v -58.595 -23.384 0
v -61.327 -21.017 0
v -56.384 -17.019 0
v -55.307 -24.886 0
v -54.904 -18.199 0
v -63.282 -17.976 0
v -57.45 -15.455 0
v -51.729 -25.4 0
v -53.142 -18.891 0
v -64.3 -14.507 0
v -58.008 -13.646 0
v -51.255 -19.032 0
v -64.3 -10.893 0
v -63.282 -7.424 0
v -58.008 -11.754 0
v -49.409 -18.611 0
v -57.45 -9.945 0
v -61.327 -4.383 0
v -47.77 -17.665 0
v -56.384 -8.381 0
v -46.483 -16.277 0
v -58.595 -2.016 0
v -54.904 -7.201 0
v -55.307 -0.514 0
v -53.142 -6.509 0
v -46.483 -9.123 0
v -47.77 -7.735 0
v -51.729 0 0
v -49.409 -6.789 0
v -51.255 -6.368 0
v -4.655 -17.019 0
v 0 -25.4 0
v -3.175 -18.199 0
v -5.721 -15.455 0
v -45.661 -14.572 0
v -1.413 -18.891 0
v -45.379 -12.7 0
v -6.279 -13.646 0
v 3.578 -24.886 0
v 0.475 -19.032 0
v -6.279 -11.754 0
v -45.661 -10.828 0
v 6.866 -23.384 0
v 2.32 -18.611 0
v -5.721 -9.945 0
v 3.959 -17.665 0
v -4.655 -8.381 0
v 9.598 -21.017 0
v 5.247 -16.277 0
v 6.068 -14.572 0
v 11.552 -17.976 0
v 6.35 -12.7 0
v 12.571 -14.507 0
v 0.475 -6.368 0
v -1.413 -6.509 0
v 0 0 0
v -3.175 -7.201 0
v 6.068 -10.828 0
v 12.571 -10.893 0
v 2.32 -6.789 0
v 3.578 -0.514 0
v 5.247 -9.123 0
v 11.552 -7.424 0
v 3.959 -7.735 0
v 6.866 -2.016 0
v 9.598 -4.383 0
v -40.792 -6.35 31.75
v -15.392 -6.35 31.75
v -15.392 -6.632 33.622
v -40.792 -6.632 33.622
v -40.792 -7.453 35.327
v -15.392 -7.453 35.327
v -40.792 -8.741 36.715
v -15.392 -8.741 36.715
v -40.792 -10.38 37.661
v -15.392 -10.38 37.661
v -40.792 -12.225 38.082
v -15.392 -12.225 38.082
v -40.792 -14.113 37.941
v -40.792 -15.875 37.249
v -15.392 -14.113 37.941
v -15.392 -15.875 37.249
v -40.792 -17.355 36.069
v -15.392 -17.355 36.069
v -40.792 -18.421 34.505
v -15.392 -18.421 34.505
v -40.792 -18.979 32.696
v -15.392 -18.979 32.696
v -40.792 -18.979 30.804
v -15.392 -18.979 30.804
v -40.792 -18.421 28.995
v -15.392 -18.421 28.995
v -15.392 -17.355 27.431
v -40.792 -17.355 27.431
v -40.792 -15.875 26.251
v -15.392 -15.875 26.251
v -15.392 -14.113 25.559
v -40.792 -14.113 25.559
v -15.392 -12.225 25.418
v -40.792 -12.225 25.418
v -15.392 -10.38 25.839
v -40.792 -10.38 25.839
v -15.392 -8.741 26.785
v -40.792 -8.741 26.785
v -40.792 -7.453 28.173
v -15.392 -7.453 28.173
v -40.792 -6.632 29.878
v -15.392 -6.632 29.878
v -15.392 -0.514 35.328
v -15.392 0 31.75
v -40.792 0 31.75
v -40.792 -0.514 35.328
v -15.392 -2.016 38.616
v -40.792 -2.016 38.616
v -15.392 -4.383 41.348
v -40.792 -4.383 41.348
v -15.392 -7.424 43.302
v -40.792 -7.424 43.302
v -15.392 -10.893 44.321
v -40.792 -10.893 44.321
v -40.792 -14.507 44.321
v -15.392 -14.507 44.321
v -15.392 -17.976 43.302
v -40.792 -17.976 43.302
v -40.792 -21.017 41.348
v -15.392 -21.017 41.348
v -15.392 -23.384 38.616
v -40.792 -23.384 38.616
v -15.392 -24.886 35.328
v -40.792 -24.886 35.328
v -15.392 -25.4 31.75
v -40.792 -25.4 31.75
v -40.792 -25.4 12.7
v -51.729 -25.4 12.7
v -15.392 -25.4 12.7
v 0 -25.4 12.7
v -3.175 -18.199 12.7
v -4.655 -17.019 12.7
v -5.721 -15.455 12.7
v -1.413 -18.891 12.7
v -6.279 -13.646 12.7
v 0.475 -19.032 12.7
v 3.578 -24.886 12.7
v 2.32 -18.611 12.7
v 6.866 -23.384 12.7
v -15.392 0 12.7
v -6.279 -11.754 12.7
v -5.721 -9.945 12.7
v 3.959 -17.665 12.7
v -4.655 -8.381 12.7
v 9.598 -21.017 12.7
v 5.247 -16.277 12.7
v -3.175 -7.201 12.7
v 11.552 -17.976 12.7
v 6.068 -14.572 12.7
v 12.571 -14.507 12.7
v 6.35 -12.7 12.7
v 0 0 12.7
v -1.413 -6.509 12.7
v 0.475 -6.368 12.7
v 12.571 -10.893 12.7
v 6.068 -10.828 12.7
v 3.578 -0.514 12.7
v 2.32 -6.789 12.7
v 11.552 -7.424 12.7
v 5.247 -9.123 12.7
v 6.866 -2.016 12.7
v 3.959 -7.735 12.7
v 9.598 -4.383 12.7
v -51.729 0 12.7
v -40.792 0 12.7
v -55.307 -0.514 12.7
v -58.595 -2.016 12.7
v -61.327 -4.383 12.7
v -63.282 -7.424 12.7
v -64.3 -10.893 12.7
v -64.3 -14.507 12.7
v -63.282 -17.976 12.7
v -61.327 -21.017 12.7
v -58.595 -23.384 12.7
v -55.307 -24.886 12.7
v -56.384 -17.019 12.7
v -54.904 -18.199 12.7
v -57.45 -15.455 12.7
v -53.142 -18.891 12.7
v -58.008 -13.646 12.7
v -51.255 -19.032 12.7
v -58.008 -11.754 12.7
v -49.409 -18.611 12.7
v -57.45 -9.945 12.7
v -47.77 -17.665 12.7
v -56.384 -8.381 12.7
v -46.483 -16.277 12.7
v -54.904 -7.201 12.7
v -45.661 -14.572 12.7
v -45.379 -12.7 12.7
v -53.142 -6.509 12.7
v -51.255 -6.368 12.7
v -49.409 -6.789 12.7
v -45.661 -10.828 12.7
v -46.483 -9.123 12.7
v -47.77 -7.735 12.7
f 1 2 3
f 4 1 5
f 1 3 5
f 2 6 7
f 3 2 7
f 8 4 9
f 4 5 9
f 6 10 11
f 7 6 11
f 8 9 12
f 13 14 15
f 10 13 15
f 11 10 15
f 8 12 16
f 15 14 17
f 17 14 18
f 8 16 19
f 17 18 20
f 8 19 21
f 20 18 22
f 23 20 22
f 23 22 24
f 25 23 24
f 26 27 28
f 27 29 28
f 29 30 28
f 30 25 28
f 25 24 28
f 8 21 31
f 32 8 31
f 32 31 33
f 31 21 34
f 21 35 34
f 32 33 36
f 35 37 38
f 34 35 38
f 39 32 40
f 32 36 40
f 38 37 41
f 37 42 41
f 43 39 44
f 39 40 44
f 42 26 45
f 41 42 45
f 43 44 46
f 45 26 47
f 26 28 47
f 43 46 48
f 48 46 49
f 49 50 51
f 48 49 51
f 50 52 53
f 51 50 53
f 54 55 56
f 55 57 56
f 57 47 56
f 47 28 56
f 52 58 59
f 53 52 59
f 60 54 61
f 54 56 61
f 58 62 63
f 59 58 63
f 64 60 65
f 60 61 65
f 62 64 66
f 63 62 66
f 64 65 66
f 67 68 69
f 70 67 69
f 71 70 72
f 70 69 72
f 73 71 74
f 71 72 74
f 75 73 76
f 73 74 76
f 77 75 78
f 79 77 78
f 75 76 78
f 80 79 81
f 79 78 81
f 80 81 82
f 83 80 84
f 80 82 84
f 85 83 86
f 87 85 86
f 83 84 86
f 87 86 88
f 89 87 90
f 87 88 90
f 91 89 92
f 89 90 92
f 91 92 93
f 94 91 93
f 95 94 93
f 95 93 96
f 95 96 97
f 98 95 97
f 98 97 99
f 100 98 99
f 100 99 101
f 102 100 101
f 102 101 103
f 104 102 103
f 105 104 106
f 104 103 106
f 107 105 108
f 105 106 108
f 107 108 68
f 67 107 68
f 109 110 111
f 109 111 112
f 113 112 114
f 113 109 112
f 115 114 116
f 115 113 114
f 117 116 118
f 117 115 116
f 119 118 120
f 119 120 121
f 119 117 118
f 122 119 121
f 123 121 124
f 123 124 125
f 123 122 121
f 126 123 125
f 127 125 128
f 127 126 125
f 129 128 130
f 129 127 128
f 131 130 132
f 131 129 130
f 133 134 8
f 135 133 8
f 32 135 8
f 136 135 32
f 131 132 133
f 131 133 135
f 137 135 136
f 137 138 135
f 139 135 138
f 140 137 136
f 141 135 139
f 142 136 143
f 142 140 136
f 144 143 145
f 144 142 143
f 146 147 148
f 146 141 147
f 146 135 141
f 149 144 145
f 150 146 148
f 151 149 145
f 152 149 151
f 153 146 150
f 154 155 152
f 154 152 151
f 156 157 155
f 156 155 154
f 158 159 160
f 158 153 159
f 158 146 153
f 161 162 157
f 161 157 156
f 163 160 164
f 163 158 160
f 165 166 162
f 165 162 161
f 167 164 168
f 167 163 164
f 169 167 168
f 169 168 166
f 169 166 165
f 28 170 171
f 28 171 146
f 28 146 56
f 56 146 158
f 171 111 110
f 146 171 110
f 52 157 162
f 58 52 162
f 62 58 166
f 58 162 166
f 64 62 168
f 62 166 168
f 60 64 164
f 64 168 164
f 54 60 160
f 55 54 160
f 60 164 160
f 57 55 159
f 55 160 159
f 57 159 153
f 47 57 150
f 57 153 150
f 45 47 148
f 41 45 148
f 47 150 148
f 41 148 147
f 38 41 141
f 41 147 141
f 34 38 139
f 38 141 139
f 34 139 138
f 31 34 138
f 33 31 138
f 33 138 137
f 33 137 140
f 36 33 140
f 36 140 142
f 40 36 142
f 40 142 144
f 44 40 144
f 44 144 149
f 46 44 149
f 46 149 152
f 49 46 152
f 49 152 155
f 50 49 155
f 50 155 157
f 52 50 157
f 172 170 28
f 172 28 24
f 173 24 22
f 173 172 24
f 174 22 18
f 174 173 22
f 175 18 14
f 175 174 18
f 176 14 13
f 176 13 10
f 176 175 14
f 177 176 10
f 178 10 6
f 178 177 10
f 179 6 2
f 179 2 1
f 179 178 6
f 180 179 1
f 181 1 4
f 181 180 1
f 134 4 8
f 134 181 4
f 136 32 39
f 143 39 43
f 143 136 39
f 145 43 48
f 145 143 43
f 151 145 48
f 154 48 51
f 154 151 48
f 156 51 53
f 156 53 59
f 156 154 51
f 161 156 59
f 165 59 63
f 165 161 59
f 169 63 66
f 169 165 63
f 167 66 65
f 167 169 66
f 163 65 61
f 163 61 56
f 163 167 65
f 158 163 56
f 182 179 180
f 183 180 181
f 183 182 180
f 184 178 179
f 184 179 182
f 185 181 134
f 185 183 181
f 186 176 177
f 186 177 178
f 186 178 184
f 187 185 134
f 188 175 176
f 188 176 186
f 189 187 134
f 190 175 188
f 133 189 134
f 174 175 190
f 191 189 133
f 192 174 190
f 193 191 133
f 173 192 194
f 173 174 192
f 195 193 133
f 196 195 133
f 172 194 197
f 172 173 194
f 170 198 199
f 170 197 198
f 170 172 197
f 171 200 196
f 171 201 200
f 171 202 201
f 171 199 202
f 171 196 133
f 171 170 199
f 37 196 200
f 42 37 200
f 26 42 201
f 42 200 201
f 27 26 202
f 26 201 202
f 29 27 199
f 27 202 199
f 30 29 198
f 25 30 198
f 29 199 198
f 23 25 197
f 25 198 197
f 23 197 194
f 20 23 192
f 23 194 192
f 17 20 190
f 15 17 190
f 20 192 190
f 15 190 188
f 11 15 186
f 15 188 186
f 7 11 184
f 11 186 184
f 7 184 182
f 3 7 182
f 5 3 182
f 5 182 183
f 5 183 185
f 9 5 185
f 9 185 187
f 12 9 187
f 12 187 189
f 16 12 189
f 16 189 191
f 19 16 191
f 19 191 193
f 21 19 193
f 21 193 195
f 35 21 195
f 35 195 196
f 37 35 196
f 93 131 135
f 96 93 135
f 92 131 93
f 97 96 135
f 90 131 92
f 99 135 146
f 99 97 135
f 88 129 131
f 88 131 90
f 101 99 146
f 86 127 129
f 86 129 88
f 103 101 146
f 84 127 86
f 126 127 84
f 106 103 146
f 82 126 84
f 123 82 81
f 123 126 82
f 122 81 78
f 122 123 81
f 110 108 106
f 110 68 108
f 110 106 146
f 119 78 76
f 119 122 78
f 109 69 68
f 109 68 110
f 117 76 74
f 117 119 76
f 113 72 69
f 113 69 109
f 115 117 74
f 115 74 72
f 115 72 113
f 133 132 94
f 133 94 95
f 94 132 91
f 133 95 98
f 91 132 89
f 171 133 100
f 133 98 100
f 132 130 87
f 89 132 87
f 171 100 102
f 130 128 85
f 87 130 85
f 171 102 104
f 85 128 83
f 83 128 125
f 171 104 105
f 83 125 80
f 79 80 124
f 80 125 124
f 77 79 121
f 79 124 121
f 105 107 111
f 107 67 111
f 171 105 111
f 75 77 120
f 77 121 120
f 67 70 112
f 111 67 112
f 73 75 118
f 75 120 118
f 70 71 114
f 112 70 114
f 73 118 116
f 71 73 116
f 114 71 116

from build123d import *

# Parameters (mm, degrees)
F0_W      = 51.7292671493
F0_H      = 12.7
F1_DEPTH  = 25.4
F3_DEPTH  = 12.7
F4_DEPTH  = 25.4
F5_W      = 25.4
F5_H      = 25.4
F6_DEPTH  = 19.05
F8_DEPTH  = 25.4
F9_R      = 6.35
F10_DEPTH = 25.4
F11_R     = 6.35
F12_DEPTH = 25.4
F13_R     = 6.35
F14_DEPTH = 25.4


with BuildPart() as f1:
    # F0 (on Front) → F1 (new body)
    with BuildSketch(Plane.XZ):
        with Locations((-25.8646335747, 6.35)):
            Rectangle(F0_W, F0_H)
    extrude(amount=F1_DEPTH)

    # F2 (on face) → F3 (join)
    with BuildSketch(Plane.XY.offset(12.7)):
        with BuildLine():
            ThreePointArc((-51.7292671493, 0), (-64.4292671493, -12.7), (-51.7292671493, -25.4))
            Line((-51.7292671493, -25.4), (-51.7292671493, 0))
        make_face()
        with BuildLine():
            Line((0, 0), (0, -25.4))
            ThreePointArc((0, -25.4), (12.7, -12.7), (0, 0))
        make_face()
    extrude(amount=-F3_DEPTH)

    # F0 (on Front) → F4 (join)
    with BuildSketch(Plane.XZ):
        with Locations((-25.8646335747, 6.35)):
            Rectangle(F0_W, F0_H)
    extrude(amount=F4_DEPTH)

    # F5 (on face) → F6 (join)
    with BuildSketch(Plane.XY.offset(12.7)):
        with Locations((-28.0921224833, -12.7)):
            Rectangle(F5_W, F5_H)
    extrude(amount=F6_DEPTH)

    # F7 (on face) → F8 (join)
    with BuildSketch(Plane.YZ.offset(-15.3921224833)):
        with BuildLine():
            Line((-25.4, 31.75), (0, 31.75))
            ThreePointArc((0, 31.75), (-12.7, 44.45), (-25.4, 31.75))
        make_face()
    extrude(amount=-F8_DEPTH)

    # F9 (on face) → F10 (cut)
    with BuildSketch(Plane.YZ.offset(-15.3921224833)):
        with Locations((-12.7, 31.75)):
            Circle(F9_R)
    extrude(amount=-F10_DEPTH, mode=Mode.SUBTRACT)

    # F11 (on face) → F12 (cut)
    with BuildSketch(Plane.XY.offset(12.7)):
        with Locations((0, -12.7)):
            Circle(F11_R)
    extrude(amount=-F12_DEPTH, mode=Mode.SUBTRACT)

    # F13 (on face) → F14 (cut)
    with BuildSketch(Plane.XY.offset(12.7)):
        with Locations((-51.7292671493, -12.7)):
            Circle(F13_R)
    extrude(amount=-F14_DEPTH, mode=Mode.SUBTRACT)


solid = f1.part
